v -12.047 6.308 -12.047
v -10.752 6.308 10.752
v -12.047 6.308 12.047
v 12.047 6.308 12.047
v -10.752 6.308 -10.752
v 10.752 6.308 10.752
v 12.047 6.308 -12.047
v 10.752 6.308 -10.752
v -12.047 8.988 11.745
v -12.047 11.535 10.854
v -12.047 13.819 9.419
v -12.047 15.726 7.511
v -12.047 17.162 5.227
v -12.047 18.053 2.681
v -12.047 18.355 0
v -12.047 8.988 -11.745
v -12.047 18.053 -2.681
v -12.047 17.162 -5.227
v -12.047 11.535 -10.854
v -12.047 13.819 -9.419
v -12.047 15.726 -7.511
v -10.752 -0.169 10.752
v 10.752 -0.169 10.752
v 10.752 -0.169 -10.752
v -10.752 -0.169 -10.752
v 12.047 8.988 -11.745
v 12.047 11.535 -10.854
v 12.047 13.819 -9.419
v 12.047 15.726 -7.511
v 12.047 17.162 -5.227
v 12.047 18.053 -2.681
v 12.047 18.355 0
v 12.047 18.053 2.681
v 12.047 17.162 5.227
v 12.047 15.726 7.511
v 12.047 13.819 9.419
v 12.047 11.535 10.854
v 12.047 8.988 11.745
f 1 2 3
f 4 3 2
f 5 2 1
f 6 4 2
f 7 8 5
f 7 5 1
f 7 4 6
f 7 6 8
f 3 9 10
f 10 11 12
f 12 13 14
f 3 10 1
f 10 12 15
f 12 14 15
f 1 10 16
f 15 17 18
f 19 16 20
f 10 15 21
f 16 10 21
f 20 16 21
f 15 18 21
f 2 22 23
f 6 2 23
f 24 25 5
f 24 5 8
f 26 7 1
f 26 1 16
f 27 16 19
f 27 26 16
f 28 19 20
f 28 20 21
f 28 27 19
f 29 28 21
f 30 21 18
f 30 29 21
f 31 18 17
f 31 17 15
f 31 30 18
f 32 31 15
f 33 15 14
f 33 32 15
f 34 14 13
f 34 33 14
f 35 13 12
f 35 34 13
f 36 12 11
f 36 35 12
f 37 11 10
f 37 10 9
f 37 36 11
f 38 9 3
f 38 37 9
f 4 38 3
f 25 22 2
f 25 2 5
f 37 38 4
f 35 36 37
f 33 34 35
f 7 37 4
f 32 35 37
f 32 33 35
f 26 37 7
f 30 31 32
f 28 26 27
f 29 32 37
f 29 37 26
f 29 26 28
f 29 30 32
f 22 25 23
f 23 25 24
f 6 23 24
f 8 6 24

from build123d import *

# Parameters (mm, degrees)
SKETCH1_W           = 21.082
SKETCH1_H           = 21.082
BOSS_EXTRUDE1_DEPTH = 6.35
BOSS_EXTRUDE2_DEPTH = 11.811
SCALE1_SCALE        = 1.02


with BuildPart() as part:
    # Sketch1 → Boss-Extrude1 (new body)
    with BuildSketch(Plane(origin=(0, 0, 0), x_dir=(1, 0, 0), z_dir=(0, 1, 0))):
        Rectangle(SKETCH1_W, SKETCH1_H)
    extrude(amount=BOSS_EXTRUDE1_DEPTH)

    # Sketch3 → Boss-Extrude2 (add, symmetric)
    with BuildSketch(Plane(origin=(0, 0, 0), x_dir=(0, 0, -1), z_dir=(1, 0, 0))):
        with BuildLine():
            Line((-11.811, 6.35), (11.811, 6.35))
            ThreePointArc((11.811, 6.35), (0, 18.161), (-11.811, 6.35))
        make_face()
    extrude(amount=BOSS_EXTRUDE2_DEPTH, both=True)


with BuildPart() as part_1:
    # Scale1: scaled about (0, 8.473688703, 0)
    add(part.part.scale(SCALE1_SCALE).moved(Location((0, -0.169473774, 0))))


solid = part_1.part
